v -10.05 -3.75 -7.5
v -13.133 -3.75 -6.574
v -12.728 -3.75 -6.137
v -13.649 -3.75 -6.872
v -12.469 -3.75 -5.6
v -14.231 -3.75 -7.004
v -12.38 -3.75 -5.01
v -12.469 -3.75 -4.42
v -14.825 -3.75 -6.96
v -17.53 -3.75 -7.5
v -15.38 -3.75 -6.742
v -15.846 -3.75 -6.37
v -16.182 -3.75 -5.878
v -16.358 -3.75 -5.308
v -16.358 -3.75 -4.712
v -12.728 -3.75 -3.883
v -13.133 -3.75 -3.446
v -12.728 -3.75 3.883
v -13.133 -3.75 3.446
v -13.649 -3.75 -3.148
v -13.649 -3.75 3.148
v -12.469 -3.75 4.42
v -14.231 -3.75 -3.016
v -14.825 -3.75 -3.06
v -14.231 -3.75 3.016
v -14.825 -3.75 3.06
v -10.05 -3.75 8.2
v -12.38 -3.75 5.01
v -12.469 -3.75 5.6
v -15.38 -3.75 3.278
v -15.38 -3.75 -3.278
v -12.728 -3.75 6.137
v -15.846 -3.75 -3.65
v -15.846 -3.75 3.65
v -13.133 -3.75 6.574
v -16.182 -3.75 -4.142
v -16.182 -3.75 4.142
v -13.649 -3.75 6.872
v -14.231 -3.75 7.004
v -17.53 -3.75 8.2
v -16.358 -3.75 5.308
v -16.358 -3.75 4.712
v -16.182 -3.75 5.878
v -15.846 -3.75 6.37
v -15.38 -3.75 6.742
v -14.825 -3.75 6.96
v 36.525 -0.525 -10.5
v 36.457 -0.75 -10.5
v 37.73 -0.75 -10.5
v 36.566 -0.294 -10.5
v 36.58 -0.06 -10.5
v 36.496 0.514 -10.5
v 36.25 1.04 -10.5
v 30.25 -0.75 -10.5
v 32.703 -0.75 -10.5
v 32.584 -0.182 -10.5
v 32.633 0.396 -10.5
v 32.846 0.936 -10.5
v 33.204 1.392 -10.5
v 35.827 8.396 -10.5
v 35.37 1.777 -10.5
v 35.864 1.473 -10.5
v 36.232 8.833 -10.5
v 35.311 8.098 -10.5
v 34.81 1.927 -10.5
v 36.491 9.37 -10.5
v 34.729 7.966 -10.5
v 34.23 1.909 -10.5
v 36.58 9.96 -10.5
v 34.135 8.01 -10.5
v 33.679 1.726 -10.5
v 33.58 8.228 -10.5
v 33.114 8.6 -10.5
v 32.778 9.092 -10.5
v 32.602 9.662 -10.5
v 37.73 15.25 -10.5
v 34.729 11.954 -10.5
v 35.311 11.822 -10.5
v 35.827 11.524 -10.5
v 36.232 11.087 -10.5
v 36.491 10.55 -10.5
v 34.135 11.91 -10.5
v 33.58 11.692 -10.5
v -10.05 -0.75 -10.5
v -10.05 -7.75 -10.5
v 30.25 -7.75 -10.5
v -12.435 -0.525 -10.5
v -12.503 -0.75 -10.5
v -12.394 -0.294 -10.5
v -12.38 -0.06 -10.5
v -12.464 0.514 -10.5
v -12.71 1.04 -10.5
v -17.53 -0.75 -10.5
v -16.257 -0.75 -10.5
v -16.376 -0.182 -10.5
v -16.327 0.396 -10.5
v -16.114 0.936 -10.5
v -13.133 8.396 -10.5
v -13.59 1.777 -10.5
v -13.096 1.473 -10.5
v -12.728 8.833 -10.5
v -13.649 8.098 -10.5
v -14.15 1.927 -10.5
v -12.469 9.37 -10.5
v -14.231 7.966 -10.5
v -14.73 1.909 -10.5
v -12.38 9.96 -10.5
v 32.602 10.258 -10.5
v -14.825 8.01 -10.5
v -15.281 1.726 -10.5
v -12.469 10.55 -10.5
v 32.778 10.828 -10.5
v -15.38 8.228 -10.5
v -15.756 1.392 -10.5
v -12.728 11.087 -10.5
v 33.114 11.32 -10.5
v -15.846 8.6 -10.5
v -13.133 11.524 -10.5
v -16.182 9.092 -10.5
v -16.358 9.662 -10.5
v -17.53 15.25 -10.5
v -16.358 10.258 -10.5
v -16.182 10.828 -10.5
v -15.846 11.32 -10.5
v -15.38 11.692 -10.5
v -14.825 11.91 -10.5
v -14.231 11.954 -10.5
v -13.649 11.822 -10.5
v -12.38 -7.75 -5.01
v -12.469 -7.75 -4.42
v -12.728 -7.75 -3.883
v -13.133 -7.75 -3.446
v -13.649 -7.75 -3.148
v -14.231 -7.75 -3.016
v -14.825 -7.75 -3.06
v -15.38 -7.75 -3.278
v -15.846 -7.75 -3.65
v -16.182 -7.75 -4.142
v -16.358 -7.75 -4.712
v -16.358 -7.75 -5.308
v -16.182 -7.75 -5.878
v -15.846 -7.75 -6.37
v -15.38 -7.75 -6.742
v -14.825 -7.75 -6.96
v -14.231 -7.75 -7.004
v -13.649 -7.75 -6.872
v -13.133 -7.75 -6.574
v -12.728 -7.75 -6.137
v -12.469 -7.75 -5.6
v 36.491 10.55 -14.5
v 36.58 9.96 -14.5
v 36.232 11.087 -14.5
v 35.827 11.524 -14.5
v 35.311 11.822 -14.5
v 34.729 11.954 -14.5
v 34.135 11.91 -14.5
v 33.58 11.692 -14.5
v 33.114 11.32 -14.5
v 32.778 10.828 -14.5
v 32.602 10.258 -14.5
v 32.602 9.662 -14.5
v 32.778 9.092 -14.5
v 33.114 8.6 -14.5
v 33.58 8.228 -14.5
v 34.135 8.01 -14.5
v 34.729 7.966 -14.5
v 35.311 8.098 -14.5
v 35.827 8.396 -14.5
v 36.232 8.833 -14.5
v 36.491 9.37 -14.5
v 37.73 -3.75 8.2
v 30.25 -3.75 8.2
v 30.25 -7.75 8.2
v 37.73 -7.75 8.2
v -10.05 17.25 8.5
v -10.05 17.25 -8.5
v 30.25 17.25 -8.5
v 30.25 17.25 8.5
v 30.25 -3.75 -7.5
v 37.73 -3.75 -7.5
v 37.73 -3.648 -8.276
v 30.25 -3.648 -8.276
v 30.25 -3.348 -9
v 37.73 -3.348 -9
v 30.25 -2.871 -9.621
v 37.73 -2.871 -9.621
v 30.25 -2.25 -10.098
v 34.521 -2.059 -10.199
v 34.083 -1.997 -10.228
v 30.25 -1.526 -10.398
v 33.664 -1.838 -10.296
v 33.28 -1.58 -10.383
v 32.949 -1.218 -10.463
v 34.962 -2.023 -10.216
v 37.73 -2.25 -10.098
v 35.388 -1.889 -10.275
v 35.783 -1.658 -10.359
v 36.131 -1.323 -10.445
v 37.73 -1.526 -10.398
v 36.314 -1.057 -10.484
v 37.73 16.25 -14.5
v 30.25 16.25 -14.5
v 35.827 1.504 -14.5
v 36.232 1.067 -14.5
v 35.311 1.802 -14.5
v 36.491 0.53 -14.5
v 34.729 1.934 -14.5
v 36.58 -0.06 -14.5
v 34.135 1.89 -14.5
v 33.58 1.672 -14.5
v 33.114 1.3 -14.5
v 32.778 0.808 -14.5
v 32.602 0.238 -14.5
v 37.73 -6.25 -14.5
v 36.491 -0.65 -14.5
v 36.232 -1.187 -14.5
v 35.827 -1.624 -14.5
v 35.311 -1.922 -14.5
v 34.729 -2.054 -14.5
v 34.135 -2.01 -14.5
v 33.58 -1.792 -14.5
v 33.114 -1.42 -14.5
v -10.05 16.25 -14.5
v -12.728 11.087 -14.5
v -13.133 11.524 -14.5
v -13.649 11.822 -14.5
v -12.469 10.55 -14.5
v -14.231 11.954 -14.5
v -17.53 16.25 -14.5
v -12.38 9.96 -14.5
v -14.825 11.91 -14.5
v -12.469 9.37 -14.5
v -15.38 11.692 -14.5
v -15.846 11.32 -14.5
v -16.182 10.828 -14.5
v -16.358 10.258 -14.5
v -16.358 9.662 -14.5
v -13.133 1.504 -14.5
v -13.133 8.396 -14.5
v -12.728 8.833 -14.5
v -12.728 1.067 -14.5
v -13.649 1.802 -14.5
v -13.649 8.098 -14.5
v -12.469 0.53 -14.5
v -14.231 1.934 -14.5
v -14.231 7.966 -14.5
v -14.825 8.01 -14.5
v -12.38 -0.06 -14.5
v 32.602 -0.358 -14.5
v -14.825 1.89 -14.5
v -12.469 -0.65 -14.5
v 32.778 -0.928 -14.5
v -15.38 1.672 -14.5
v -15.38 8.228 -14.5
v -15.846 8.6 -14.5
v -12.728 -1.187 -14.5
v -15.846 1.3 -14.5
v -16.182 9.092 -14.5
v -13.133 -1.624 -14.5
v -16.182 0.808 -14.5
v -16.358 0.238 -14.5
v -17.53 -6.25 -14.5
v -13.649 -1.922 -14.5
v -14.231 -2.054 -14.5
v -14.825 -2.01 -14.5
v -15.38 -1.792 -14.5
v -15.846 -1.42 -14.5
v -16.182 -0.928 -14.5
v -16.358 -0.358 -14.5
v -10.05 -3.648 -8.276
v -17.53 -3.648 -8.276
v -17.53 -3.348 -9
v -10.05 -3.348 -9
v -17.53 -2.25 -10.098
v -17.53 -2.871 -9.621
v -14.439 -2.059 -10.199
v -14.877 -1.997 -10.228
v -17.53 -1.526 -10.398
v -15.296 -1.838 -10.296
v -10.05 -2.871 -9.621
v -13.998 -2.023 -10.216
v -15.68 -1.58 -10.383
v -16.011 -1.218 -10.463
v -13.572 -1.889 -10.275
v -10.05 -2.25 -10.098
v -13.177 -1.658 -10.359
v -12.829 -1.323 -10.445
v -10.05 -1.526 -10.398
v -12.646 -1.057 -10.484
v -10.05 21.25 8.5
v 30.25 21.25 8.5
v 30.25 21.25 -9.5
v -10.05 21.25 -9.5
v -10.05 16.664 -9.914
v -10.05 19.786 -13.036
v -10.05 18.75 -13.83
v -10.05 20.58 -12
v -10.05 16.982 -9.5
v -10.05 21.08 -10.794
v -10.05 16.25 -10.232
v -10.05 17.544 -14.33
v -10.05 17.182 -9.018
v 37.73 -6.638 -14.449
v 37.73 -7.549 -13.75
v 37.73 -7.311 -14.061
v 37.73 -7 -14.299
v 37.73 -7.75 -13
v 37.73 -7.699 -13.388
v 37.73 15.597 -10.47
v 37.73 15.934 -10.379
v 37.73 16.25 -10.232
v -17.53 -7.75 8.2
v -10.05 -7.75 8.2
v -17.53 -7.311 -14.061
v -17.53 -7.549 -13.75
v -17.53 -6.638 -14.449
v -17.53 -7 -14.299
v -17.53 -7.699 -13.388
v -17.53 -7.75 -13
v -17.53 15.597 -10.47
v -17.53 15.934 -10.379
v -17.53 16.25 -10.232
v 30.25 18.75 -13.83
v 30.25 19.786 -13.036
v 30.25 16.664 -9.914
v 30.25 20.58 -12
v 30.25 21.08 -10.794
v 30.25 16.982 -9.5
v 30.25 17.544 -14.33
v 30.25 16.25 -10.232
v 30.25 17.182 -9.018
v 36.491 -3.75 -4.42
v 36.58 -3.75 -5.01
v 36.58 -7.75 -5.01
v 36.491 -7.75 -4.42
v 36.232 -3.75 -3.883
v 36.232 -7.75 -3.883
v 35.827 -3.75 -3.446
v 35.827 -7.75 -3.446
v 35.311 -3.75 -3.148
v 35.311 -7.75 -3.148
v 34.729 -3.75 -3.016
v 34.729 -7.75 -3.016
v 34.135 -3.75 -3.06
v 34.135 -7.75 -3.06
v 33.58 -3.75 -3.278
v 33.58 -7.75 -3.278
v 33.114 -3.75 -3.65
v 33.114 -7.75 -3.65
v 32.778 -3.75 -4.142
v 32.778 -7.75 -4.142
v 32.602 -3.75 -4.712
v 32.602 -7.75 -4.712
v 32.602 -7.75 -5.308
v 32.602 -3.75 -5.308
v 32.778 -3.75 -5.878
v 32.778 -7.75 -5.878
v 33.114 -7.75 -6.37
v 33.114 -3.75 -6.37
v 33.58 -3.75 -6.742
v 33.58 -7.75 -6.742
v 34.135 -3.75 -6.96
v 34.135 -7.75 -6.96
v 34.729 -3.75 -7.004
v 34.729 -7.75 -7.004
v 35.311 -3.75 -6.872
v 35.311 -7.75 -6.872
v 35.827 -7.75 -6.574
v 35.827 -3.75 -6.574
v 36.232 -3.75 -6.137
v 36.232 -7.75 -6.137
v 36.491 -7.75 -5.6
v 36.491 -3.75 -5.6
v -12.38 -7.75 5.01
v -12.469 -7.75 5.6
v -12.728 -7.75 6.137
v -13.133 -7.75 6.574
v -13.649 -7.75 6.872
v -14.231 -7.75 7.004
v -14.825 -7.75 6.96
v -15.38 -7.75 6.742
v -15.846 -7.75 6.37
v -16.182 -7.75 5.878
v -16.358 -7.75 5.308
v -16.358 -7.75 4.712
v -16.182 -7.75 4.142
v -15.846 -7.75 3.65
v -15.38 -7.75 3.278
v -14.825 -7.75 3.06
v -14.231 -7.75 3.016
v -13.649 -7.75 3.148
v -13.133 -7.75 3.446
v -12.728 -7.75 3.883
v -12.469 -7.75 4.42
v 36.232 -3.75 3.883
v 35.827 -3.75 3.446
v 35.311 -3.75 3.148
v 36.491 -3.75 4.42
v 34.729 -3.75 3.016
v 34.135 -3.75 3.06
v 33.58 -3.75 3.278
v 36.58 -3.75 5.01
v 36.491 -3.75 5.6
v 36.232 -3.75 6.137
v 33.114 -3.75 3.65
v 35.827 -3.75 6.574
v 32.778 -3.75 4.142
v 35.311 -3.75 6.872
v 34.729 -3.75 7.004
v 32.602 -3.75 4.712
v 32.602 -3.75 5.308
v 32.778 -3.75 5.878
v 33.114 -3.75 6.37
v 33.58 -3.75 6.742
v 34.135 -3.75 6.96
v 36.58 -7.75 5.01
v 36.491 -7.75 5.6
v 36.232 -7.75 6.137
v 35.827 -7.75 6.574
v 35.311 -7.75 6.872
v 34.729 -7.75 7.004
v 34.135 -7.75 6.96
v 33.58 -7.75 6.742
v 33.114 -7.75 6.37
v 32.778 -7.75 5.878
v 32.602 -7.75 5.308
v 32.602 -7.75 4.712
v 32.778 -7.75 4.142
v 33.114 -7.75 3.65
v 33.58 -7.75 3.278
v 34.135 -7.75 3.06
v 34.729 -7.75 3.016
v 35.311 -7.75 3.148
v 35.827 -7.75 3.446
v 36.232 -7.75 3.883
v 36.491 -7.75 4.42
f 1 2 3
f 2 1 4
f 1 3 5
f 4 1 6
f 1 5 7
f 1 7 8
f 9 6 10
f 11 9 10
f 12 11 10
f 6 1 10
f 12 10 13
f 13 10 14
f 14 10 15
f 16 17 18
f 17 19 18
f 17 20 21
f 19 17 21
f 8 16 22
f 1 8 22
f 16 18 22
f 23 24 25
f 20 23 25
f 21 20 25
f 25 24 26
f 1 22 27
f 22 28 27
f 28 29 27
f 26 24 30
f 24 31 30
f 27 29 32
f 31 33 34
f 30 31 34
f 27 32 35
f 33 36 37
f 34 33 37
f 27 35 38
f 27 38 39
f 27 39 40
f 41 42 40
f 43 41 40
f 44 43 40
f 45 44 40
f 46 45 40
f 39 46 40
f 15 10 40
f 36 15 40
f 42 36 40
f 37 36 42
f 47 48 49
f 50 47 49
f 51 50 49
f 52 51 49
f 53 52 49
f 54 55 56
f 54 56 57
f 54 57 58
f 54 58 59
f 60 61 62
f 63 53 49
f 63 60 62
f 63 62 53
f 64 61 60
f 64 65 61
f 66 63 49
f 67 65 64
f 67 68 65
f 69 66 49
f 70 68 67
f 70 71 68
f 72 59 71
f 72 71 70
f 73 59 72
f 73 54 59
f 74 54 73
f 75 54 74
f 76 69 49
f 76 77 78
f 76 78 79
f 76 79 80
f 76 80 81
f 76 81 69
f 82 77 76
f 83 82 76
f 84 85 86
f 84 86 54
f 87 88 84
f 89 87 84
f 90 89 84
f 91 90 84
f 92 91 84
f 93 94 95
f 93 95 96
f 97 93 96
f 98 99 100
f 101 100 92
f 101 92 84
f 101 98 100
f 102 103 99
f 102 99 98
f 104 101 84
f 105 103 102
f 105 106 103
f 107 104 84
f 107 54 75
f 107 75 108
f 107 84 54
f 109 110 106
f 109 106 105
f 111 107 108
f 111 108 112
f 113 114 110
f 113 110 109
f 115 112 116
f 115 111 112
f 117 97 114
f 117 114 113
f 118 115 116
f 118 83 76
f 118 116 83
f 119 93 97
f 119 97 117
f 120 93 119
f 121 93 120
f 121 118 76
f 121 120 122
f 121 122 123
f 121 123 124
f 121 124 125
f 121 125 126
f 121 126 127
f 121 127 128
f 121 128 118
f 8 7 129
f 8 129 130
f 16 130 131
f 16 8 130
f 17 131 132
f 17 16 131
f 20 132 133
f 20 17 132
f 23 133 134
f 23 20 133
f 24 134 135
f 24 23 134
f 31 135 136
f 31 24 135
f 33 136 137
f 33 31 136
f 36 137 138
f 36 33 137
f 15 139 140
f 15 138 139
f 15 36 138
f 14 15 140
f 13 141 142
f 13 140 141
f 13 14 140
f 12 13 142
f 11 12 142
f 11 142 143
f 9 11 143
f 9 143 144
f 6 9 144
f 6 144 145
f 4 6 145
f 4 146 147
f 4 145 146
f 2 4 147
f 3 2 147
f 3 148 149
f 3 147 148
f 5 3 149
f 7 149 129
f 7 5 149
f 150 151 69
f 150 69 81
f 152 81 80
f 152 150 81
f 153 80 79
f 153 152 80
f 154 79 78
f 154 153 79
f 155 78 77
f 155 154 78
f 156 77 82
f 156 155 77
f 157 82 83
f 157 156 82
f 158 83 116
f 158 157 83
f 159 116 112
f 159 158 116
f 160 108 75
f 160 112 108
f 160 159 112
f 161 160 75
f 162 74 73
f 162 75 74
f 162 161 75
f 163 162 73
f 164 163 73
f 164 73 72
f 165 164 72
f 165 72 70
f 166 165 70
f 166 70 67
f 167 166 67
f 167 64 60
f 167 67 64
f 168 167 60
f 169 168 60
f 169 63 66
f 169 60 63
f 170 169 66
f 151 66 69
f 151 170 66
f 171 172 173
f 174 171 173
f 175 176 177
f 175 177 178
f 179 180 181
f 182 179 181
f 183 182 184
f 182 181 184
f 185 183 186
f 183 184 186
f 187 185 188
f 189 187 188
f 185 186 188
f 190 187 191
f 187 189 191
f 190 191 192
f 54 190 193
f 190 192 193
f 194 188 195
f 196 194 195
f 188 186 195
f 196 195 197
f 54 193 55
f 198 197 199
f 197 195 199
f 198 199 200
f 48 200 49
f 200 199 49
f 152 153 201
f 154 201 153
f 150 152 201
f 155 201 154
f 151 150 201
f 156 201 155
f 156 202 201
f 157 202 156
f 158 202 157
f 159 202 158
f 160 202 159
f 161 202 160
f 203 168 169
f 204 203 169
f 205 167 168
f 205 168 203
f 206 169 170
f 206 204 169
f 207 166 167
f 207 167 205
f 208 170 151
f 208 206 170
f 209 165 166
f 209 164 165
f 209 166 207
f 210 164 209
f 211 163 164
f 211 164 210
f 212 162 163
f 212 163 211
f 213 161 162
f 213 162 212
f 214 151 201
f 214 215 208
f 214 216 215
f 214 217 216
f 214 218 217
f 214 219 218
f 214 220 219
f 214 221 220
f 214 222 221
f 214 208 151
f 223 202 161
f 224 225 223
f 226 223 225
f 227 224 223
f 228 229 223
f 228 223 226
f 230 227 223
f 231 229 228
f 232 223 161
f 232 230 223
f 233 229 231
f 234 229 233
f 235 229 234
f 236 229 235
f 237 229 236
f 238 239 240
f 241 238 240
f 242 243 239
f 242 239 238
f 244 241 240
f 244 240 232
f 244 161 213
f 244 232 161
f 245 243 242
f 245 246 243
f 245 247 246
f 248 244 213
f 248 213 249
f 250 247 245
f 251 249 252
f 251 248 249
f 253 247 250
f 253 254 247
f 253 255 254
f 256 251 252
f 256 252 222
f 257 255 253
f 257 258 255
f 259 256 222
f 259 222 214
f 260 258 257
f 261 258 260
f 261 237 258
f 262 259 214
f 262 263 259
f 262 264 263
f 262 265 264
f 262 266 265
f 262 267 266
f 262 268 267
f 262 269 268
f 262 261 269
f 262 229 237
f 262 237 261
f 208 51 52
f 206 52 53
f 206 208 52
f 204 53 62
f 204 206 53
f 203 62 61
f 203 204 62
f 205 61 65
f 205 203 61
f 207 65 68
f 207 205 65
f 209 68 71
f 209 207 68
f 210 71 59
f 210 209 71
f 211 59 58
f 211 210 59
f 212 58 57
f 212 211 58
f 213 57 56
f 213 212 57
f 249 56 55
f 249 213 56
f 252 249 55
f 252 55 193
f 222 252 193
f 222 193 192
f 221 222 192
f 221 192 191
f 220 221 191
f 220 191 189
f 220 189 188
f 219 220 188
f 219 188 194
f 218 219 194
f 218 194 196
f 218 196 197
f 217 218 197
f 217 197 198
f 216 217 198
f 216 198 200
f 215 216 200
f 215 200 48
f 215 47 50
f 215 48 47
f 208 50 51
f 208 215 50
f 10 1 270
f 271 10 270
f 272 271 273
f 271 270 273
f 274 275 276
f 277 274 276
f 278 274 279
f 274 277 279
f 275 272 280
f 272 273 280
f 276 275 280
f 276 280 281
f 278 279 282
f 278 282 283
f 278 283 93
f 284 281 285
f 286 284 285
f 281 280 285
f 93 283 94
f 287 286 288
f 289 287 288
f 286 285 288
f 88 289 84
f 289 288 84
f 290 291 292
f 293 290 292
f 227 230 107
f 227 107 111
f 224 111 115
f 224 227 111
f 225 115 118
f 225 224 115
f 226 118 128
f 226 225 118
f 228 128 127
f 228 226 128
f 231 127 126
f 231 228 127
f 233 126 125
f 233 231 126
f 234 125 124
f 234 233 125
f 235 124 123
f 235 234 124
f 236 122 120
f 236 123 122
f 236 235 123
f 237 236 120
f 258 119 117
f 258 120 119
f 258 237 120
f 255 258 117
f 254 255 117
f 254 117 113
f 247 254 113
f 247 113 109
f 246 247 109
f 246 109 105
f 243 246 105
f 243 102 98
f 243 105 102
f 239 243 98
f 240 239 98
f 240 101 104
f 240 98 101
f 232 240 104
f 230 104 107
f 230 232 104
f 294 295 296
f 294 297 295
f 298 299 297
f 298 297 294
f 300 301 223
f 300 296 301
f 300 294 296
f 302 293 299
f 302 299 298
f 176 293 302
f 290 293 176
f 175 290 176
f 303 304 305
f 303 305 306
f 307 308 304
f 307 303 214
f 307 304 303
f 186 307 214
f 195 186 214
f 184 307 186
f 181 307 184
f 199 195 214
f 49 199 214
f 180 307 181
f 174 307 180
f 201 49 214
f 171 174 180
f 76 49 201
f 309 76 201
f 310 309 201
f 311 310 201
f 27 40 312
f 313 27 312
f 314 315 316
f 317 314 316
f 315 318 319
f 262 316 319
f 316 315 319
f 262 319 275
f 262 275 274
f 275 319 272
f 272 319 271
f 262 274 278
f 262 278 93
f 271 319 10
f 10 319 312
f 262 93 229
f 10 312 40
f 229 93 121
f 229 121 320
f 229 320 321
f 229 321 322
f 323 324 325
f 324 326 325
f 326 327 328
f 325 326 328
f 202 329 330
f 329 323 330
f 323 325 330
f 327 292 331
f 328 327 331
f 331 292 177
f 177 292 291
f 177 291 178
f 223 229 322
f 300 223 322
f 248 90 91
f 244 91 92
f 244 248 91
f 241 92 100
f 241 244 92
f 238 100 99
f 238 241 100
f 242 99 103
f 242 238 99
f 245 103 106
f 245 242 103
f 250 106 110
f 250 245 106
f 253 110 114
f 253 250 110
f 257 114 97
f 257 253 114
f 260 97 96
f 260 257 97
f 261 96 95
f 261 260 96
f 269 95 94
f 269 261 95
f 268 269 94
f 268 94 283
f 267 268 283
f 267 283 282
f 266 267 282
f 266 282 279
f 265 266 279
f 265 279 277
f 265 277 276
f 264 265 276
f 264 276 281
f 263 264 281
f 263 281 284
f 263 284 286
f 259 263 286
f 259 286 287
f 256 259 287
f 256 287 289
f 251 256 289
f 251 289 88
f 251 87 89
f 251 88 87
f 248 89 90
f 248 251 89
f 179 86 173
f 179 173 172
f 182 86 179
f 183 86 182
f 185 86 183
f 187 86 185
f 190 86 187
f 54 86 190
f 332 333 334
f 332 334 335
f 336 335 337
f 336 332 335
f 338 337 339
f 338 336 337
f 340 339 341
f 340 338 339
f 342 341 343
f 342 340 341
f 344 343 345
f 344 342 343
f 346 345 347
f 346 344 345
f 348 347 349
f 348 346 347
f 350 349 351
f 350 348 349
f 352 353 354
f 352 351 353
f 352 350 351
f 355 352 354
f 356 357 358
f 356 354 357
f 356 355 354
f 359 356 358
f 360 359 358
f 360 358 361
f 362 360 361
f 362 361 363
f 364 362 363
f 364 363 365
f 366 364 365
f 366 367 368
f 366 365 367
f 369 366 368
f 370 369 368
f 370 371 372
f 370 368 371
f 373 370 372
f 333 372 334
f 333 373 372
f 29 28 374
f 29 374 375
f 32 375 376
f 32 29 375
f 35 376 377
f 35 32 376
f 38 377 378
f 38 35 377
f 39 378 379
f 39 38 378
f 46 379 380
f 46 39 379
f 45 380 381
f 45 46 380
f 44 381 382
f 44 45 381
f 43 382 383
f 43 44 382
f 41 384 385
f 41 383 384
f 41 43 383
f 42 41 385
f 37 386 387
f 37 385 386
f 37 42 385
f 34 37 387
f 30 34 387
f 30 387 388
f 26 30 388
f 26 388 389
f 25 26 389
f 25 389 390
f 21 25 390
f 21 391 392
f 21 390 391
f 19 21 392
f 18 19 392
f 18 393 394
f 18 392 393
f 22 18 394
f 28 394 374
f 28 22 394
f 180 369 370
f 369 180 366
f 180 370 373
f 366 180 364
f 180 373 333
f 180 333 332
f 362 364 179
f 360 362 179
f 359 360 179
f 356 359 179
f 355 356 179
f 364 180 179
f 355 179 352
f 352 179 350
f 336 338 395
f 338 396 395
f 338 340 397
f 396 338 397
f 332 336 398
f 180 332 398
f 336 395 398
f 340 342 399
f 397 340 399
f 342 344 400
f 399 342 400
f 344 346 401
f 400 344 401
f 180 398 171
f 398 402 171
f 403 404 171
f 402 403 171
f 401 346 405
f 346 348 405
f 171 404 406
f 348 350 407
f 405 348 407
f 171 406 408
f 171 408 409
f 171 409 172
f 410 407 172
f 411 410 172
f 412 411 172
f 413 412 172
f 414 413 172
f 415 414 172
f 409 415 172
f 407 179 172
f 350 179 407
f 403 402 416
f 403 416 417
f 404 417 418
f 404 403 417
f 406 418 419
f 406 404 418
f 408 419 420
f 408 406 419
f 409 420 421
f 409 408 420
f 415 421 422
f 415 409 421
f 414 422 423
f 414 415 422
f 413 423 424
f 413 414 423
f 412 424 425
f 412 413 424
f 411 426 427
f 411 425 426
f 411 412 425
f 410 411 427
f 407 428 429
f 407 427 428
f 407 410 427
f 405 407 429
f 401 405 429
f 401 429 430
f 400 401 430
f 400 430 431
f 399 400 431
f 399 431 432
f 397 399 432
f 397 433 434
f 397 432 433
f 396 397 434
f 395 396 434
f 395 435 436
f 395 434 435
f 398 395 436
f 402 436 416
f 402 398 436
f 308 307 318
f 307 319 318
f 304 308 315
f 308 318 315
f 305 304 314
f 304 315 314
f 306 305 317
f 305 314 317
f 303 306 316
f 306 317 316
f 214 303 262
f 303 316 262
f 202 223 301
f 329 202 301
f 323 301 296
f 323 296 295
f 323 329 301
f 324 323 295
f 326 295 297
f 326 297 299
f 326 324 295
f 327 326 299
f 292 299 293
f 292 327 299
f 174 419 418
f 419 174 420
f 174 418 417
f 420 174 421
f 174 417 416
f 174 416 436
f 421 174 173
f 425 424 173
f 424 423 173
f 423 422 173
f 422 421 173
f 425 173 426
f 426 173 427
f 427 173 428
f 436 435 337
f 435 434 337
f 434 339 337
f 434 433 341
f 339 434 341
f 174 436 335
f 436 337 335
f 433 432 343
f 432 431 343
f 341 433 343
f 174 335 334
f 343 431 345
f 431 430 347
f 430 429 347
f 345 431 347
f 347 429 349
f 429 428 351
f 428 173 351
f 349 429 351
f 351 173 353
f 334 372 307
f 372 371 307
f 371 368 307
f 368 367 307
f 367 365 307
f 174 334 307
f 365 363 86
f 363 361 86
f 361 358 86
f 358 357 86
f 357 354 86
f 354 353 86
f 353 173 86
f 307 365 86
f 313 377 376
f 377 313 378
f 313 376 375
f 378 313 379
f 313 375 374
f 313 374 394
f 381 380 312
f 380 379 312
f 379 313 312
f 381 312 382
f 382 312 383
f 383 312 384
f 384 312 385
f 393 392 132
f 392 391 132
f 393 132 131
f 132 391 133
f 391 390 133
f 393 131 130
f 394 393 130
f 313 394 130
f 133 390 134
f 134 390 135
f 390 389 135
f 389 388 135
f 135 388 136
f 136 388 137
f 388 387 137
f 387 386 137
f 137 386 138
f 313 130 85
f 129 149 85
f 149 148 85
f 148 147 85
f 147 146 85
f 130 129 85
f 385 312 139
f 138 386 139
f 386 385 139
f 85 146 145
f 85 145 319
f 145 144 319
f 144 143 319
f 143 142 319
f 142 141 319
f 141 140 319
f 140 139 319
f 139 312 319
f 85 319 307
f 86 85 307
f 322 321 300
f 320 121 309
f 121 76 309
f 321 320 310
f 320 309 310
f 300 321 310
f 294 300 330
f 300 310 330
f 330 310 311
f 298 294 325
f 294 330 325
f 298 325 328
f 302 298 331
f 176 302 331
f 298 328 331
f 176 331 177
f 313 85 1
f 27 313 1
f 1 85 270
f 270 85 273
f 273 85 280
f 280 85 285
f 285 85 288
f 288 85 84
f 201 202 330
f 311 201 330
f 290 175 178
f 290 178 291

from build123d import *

# Parameters (mm, degrees)
CYLINDER015_R          = 2
CYLINDER015_DEPTH      = 15
CYLINDER015_ROLL_ANGLE = 90
CYLINDER007_R          = 2
CYLINDER007_DEPTH      = 15
CYLINDER006_R          = 2
CYLINDER006_DEPTH      = 15
CYLINDER005_R          = 2
CYLINDER005_DEPTH      = 15
CYLINDER004_R          = 2
CYLINDER004_DEPTH      = 15
CYLINDER003_R          = 2
CYLINDER003_DEPTH      = 15
CYLINDER003_ROLL_ANGLE = 90
CYLINDER002_R          = 2
CYLINDER002_DEPTH      = 15
CYLINDER002_ROLL_ANGLE = 90
CYLINDER001_R          = 2
CYLINDER001_DEPTH      = 15
CYLINDER001_ROLL_ANGLE = 90
CYLINDER_R             = 2
CYLINDER_DEPTH         = 15
CYLINDER_ROLL_ANGLE    = 90
PAD002_DEPTH           = 40.3
BOX_W                  = 40.3
BOX_H                  = 15
BOX_DEPTH              = 25
PAD003_DEPTH           = 55.26
FILLET_R               = 3
FILLET001_R            = 1.5
FILLET002_R            = 2
FILLET005_R            = 5


with BuildPart() as cilindro015:
    # Cylinder015 → Cylinder015 (new body)
    with BuildSketch(Plane.XY):
        Circle(CYLINDER015_R)
    extrude(amount=CYLINDER015_DEPTH)


with BuildPart() as cilindro015_1:
    # Cylinder015 roll: moved
    add(cilindro015.part.rotate(Axis((0, 0, 0), (1, 0, 0)), CYLINDER015_ROLL_ANGLE))


with BuildPart() as cilindro015_2:
    # Cylinder015 placement: moved
    add(cilindro015_1.part.moved(Location((-24.48, 4.65, 15.01))))


with BuildPart() as cilindro007:
    # Cylinder007 → Cylinder007 (new body)
    with BuildSketch(Plane(origin=(24.48, 10.01, -12.65), x_dir=(1, 0, 0), z_dir=(0, 0, 1))):
        Circle(CYLINDER007_R)
    extrude(amount=CYLINDER007_DEPTH)


with BuildPart() as cilindro006:
    # Cylinder006 → Cylinder006 (new body)
    with BuildSketch(Plane(origin=(-24.48, -0.01, -12.65), x_dir=(1, 0, 0), z_dir=(0, 0, 1))):
        Circle(CYLINDER006_R)
    extrude(amount=CYLINDER006_DEPTH)


with BuildPart() as cilindro005:
    # Cylinder005 → Cylinder005 (new body)
    with BuildSketch(Plane(origin=(24.48, -0.01, -12.65), x_dir=(1, 0, 0), z_dir=(0, 0, 1))):
        Circle(CYLINDER005_R)
    extrude(amount=CYLINDER005_DEPTH)


with BuildPart() as cilindro004:
    # Cylinder004 → Cylinder004 (new body)
    with BuildSketch(Plane(origin=(-24.48, 10.01, -12.65), x_dir=(1, 0, 0), z_dir=(0, 0, 1))):
        Circle(CYLINDER004_R)
    extrude(amount=CYLINDER004_DEPTH)


with BuildPart() as cilindro003:
    # Cylinder003 → Cylinder003 (new body)
    with BuildSketch(Plane.XY):
        Circle(CYLINDER003_R)
    extrude(amount=CYLINDER003_DEPTH)


with BuildPart() as cilindro003_1:
    # Cylinder003 roll: moved
    add(cilindro003.part.rotate(Axis((0, 0, 0), (1, 0, 0)), CYLINDER003_ROLL_ANGLE))


with BuildPart() as cilindro003_2:
    # Cylinder003 placement: moved
    add(cilindro003_1.part.moved(Location((-24.48, 4.65, 4.99))))


with BuildPart() as cilindro002:
    # Cylinder002 → Cylinder002 (new body)
    with BuildSketch(Plane.XY):
        Circle(CYLINDER002_R)
    extrude(amount=CYLINDER002_DEPTH)


with BuildPart() as cilindro002_1:
    # Cylinder002 roll: moved
    add(cilindro002.part.rotate(Axis((0, 0, 0), (1, 0, 0)), CYLINDER002_ROLL_ANGLE))


with BuildPart() as cilindro002_2:
    # Cylinder002 placement: moved
    add(cilindro002_1.part.moved(Location((-24.48, 4.65, 15.01))))


with BuildPart() as cilindro001:
    # Cylinder001 → Cylinder001 (new body)
    with BuildSketch(Plane.XY):
        Circle(CYLINDER001_R)
    extrude(amount=CYLINDER001_DEPTH)


with BuildPart() as cilindro001_1:
    # Cylinder001 roll: moved
    add(cilindro001.part.rotate(Axis((0, 0, 0), (1, 0, 0)), CYLINDER001_ROLL_ANGLE))


with BuildPart() as cilindro001_2:
    # Cylinder001 placement: moved
    add(cilindro001_1.part.moved(Location((24.48, 4.65, 4.99))))


with BuildPart() as cilindro:
    # Cylinder → Cylinder (new body)
    with BuildSketch(Plane.XY):
        Circle(CYLINDER_R)
    extrude(amount=CYLINDER_DEPTH)


with BuildPart() as cilindro_1:
    # Cylinder roll: moved
    add(cilindro.part.rotate(Axis((0, 0, 0), (1, 0, 0)), CYLINDER_ROLL_ANGLE))


with BuildPart() as cilindro_2:
    # Cylinder placement: moved
    add(cilindro_1.part.moved(Location((24.48, 4.65, 15.01))))


with BuildPart() as pad002:
    # Sketch002 → Pad002 (new body)
    with BuildSketch(Plane.YZ.offset(-20.15)):
        Polygon((17.3, 18.5), (21.3, 18.5), (21.3, -4.5), (-7.7, -4.5), (-7.7, -0.5), (17.3, -0.5), align=None)
    extrude(amount=PAD002_DEPTH)


with BuildPart() as cubo:
    # Box → Box (new body)
    with BuildSketch(Plane(origin=(-20.15, -12.7, -2.5), x_dir=(1, 0, 0), z_dir=(0, 0, 1))):
        with Locations((20.15, 7.5)):
            Rectangle(BOX_W, BOX_H)
    extrude(amount=BOX_DEPTH)


with BuildPart() as pieza1v1:
    # Sketch003 → Pad003 (new body)
    with BuildSketch(Plane.YZ.offset(-27.63)):
        Polygon((-7.7, -4.5), (16.3, -4.5), (16.3, -0.5), (-3.7, -0.5), (-3.7, 18.2), (-7.7, 18.2), align=None)
    extrude(amount=PAD003_DEPTH)

    # Cut: cut Cubo
    add(cubo.part, mode=Mode.SUBTRACT)

    # Fusion: union Pad002
    add(pad002.part)

    # Fillet
    fillet_edges = [pieza1v1.edges().sort_by_distance(p)[0] for p in [
        (-23.89, -3.7, -0.5),
        (23.89, -3.7, -0.5),
    ]]
    fillet(fillet_edges, radius=FILLET_R)

    # Fillet001
    fillet001_edges = [pieza1v1.edges().sort_by_distance(p)[0] for p in [
        (0, -7.7, -4.5),
    ]]
    fillet(fillet001_edges, radius=FILLET001_R)

    # Fillet002
    fillet002_edges = [pieza1v1.edges().sort_by_distance(p)[0] for p in [
        (0, 17.3, -0.5),
    ]]
    fillet(fillet002_edges, radius=FILLET002_R)

    # Fillet005
    fillet005_edges = [pieza1v1.edges().sort_by_distance(p)[0] for p in [
        (0, 21.3, -4.5),
    ]]
    fillet(fillet005_edges, radius=FILLET005_R)

    # Cut015: cut Cilindro
    add(cilindro_2.part, mode=Mode.SUBTRACT)

    # Cut016: cut Cilindro001
    add(cilindro001_2.part, mode=Mode.SUBTRACT)

    # Cut017: cut Cilindro002
    add(cilindro002_2.part, mode=Mode.SUBTRACT)

    # Cut018: cut Cilindro003
    add(cilindro003_2.part, mode=Mode.SUBTRACT)

    # Cut019: cut Cilindro004
    add(cilindro004.part, mode=Mode.SUBTRACT)

    # Cut020: cut Cilindro005
    add(cilindro005.part, mode=Mode.SUBTRACT)

    # Cut021: cut Cilindro006
    add(cilindro006.part, mode=Mode.SUBTRACT)

    # Cut022: cut Cilindro007
    add(cilindro007.part, mode=Mode.SUBTRACT)

    # Cut023: cut Cilindro015
    add(cilindro015_2.part, mode=Mode.SUBTRACT)


with BuildPart() as pieza1v1_1:
    # Cut023 placement: moved
    add(pieza1v1.part.moved(Location((10.1, -0.05, -10))))


solid = pieza1v1_1.part
